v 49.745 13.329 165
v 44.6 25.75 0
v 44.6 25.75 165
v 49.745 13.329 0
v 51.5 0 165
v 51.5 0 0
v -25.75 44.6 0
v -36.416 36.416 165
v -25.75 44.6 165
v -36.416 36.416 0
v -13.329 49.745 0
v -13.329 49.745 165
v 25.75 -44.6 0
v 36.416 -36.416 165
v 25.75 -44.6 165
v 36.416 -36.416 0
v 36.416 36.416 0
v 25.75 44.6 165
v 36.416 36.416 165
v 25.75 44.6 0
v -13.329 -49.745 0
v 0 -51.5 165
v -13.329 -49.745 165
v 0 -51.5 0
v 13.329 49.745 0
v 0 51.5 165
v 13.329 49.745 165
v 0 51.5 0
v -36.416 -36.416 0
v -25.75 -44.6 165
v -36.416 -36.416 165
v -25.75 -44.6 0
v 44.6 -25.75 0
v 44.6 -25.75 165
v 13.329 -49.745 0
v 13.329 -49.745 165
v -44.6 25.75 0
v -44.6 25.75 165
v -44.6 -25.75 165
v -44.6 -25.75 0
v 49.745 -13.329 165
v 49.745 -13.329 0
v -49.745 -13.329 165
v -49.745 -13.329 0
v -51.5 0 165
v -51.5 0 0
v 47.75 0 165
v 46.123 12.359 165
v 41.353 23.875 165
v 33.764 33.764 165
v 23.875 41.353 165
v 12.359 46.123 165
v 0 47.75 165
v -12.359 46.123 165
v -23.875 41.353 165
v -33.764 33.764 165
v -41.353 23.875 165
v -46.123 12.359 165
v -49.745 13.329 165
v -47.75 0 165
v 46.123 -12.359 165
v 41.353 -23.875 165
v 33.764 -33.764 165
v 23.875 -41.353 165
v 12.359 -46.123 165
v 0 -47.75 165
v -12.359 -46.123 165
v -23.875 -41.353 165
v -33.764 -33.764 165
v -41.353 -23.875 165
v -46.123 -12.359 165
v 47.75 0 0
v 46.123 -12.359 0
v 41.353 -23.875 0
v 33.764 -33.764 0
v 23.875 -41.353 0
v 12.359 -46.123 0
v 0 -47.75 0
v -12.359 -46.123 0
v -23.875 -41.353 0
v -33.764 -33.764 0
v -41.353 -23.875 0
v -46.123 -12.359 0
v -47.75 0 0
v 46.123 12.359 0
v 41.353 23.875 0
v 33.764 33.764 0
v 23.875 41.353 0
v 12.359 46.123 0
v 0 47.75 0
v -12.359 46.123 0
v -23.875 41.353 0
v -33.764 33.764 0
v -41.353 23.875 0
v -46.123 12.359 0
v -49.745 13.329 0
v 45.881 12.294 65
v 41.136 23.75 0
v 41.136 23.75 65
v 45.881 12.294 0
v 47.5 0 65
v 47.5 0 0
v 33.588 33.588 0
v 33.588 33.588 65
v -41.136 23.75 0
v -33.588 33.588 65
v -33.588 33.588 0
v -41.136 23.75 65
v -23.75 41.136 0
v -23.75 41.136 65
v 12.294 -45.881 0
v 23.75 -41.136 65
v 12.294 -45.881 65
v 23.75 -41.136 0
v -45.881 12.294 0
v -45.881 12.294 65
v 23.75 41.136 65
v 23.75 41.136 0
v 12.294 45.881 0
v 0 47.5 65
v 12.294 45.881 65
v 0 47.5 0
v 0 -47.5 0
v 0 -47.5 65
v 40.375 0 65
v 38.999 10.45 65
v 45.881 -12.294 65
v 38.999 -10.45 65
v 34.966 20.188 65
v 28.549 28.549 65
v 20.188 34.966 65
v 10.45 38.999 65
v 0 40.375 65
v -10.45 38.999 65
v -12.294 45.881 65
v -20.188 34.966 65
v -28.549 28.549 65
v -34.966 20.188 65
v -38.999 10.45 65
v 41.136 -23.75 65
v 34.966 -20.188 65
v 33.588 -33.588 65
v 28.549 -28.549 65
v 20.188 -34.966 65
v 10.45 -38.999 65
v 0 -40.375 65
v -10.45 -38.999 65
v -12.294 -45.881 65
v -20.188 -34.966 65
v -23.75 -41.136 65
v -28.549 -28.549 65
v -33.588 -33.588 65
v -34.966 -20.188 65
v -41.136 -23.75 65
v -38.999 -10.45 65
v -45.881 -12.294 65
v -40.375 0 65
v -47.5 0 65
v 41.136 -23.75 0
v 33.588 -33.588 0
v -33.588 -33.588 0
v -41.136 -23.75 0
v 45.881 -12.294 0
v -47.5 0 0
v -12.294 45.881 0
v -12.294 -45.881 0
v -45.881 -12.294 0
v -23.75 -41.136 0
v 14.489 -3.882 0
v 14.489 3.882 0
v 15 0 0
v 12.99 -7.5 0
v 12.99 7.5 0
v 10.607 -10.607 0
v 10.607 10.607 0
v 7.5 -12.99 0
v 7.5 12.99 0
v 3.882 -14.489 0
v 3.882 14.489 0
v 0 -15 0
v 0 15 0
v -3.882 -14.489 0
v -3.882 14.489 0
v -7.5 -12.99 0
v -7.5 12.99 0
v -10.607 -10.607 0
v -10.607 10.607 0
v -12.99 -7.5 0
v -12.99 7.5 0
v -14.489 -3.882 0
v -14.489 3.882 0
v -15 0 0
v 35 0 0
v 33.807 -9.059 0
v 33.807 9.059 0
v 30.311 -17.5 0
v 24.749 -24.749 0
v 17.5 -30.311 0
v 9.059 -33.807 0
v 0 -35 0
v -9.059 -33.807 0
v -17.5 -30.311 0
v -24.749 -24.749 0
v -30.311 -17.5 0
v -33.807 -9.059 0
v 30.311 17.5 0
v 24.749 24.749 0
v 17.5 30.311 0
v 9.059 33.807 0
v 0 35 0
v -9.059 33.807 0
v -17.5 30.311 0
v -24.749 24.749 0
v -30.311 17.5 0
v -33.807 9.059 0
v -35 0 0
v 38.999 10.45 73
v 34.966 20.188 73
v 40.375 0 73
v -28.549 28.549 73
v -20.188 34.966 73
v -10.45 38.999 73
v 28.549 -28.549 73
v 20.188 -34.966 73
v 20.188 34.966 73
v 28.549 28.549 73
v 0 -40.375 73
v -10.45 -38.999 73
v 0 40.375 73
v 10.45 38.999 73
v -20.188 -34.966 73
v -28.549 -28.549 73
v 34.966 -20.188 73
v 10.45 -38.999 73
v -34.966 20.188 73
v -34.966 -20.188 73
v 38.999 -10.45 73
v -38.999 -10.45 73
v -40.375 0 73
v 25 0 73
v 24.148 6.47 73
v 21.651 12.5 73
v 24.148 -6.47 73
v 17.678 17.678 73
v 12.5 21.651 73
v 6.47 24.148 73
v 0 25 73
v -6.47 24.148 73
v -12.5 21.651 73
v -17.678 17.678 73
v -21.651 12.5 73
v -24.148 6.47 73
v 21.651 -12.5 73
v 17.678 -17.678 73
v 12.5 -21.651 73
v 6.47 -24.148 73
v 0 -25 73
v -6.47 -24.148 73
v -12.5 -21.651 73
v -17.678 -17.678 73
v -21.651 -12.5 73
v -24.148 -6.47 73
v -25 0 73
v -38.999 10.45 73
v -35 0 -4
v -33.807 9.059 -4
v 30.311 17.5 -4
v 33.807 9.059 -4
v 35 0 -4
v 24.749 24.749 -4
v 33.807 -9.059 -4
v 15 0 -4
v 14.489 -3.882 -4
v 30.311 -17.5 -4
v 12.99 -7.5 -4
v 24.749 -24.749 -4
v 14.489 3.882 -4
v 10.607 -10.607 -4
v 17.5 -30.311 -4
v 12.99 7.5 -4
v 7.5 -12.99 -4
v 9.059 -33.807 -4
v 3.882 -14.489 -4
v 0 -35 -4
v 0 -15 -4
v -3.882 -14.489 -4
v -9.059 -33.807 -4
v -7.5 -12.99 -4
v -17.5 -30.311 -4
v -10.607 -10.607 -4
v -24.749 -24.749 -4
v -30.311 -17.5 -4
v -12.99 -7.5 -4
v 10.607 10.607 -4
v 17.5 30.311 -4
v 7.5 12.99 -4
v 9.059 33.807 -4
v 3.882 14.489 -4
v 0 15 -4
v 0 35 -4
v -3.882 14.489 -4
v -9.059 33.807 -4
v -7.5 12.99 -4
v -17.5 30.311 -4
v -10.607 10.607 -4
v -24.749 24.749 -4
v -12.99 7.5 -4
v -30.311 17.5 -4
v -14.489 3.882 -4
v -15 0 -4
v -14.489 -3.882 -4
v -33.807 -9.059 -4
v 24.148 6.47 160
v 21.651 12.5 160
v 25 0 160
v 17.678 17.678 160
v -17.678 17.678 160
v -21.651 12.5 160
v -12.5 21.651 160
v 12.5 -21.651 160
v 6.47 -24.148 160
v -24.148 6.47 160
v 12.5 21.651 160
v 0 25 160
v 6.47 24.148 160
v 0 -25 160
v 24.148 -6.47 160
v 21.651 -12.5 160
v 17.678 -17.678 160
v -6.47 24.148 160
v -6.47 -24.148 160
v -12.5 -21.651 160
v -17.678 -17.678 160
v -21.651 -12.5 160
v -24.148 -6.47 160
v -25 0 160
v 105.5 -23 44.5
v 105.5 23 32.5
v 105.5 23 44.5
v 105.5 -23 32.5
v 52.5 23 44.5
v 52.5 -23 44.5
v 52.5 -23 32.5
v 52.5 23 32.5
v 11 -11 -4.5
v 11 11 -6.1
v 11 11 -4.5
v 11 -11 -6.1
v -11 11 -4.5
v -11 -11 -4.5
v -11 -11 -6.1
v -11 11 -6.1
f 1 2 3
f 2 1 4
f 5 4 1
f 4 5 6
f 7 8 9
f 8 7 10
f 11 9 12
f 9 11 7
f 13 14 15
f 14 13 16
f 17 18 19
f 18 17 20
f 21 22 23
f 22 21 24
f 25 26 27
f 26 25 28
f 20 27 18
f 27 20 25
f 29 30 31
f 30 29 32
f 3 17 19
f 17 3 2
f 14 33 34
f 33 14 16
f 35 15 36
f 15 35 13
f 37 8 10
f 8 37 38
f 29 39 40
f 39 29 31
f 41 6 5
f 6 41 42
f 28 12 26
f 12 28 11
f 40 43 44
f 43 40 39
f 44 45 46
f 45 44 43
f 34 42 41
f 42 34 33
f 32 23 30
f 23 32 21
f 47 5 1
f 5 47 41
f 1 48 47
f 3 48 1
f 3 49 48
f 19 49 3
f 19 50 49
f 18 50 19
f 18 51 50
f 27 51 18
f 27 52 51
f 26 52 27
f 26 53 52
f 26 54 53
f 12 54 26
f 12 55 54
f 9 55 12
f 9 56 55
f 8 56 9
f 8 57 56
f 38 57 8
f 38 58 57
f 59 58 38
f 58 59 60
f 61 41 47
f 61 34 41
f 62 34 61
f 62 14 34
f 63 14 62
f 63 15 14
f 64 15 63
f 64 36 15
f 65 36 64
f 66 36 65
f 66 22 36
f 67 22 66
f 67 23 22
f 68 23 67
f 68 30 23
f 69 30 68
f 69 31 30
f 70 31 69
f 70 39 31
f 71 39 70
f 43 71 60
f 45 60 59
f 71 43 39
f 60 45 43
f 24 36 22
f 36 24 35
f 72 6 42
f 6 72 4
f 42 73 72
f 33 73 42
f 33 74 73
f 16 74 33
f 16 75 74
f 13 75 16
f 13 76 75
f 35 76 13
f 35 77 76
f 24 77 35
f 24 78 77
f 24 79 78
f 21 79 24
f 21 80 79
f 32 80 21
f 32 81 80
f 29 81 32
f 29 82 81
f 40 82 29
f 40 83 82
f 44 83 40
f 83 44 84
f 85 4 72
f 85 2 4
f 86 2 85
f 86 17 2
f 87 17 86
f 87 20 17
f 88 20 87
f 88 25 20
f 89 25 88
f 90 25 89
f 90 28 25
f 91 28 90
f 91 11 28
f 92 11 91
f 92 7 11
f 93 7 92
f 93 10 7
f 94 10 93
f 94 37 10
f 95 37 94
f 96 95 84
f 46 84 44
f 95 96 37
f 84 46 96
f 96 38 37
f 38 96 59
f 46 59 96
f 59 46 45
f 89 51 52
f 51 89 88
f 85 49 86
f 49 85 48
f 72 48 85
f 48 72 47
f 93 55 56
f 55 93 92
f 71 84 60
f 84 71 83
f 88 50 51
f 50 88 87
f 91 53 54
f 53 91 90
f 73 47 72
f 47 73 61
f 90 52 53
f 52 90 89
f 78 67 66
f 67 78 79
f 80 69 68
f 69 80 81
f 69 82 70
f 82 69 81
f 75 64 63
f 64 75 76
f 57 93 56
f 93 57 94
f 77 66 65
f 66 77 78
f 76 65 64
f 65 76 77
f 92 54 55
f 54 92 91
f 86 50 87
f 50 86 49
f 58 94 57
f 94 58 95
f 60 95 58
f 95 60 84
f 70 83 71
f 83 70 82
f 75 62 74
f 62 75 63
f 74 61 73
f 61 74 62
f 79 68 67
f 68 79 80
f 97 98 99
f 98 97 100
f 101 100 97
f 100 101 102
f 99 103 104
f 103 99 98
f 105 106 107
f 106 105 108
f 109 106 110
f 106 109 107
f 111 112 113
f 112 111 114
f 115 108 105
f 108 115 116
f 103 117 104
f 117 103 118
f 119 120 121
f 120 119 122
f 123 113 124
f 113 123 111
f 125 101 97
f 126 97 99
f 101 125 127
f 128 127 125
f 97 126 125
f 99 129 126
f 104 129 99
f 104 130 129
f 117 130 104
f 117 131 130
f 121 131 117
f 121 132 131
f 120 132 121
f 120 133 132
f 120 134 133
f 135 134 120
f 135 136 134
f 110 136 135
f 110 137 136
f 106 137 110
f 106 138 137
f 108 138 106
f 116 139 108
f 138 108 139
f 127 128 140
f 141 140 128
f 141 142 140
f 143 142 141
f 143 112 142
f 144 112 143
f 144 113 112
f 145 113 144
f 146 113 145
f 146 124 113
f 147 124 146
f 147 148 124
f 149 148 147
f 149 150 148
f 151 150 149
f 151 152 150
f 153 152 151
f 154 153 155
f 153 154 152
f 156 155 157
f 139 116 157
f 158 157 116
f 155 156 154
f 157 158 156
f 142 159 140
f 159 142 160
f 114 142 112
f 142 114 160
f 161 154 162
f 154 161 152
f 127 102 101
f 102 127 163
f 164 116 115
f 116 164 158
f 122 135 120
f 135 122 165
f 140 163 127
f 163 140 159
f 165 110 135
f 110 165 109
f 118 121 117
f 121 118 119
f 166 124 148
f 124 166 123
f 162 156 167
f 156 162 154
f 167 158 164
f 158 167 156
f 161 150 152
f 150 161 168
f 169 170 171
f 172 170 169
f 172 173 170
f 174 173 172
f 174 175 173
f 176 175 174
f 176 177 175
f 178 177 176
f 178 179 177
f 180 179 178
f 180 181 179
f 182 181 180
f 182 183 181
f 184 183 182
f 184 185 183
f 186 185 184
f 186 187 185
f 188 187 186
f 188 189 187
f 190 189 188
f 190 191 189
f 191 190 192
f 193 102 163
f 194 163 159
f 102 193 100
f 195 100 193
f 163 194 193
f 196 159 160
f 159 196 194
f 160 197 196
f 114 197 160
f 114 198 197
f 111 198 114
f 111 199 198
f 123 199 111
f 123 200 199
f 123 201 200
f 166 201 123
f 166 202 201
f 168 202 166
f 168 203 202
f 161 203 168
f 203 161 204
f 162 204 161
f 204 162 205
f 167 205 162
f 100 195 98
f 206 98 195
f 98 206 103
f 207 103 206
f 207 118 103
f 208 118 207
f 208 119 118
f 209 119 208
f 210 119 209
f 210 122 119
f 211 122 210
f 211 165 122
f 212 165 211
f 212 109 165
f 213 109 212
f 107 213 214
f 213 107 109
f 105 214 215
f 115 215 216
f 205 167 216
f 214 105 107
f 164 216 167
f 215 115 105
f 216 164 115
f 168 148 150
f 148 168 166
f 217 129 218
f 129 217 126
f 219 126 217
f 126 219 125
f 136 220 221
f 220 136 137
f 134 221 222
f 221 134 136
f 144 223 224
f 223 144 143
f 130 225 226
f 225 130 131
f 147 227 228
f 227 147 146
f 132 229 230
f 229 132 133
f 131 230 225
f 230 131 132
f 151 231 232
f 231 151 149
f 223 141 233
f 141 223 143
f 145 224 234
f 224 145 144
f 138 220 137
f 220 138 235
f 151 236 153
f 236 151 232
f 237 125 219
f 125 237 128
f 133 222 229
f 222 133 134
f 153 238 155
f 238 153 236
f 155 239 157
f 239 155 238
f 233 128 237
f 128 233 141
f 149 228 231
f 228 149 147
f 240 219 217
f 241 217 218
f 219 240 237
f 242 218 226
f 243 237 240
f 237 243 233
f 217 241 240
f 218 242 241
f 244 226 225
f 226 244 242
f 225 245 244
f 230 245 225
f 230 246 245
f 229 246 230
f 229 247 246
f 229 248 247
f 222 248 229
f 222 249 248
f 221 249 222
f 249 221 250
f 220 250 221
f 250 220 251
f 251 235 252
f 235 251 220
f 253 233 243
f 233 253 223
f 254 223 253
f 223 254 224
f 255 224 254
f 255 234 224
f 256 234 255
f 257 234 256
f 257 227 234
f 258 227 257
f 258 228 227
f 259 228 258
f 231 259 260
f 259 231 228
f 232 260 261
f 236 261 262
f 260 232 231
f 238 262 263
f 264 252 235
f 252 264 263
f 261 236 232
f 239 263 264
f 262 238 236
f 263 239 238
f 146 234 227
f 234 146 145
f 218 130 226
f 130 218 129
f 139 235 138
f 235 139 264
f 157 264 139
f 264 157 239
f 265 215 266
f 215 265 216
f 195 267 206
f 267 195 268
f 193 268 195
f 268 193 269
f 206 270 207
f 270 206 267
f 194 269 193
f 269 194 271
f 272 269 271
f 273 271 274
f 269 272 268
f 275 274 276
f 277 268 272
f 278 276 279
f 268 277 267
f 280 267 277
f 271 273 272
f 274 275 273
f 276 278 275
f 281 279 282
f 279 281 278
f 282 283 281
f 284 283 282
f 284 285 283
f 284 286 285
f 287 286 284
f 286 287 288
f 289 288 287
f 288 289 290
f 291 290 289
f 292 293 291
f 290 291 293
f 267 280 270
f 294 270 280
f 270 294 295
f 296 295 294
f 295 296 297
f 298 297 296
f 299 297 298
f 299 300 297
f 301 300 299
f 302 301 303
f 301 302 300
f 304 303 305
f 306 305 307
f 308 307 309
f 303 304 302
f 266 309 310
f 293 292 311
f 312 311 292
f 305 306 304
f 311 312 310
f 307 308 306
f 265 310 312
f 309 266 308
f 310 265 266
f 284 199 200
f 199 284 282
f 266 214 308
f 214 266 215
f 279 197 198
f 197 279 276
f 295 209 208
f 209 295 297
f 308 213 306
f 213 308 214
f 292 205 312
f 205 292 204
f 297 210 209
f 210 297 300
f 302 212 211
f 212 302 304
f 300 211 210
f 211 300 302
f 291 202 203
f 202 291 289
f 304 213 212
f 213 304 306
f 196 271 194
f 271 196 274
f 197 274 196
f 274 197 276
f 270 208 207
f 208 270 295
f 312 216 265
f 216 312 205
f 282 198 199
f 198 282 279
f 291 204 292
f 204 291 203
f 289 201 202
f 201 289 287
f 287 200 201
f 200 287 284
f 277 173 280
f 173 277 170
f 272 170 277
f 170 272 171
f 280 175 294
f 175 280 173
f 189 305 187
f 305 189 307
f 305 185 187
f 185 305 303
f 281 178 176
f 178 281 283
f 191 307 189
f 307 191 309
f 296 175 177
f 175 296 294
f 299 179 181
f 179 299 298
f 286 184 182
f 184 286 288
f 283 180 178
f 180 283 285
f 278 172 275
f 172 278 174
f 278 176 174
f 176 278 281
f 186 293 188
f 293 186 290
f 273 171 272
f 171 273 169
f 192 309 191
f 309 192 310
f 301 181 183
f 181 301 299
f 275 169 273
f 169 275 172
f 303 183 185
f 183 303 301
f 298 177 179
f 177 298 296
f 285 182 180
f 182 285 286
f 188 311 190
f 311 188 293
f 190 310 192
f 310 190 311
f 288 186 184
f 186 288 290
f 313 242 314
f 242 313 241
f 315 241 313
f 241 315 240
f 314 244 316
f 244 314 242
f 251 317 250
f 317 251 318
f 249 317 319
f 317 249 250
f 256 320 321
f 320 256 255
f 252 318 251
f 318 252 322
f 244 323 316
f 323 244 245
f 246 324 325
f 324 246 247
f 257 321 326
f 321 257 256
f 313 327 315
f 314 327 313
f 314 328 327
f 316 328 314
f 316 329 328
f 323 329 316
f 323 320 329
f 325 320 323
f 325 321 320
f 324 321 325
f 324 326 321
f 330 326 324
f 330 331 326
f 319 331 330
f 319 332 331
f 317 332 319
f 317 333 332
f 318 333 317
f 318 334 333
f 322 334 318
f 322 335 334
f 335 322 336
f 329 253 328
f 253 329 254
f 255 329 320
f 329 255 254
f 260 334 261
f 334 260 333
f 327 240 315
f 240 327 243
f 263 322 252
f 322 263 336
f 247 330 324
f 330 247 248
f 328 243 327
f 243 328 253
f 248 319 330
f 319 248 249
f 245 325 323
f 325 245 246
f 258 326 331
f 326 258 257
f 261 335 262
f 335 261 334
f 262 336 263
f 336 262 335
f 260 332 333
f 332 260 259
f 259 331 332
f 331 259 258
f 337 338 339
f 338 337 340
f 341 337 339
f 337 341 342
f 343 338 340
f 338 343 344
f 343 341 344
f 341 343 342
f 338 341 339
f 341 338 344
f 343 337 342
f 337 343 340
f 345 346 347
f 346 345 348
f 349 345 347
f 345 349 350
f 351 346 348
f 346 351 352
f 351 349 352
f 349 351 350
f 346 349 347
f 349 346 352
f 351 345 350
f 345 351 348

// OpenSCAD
// file: hip.scad
// hip.scad
// Free Humanoid Platform — Leg v0.1 — hip 3-DoF cluster
//
// Three serial revolute joints (yaw → abduction → flexion) clustered so
// their axes intersect at the hip center. Each joint = cycloidal reducer
// (BOM hip_*_reducer) + Maxon EC-i 50/52 BLDC motor + Moteus n1 + AS5048A
// + optional strain-gauge bridge.
//
// Module signature: hip(joint_torques = [yaw, abd, flex])
//                   Peak torques in N·m used to size envelopes; defaults
//                   come from leg_params.scad.
//
// Corpus: sumitomo-cyclo (1937) for cycloidal prior-art shielding.
// REFERENCE GEOMETRY — NOT VALIDATED BY PHYSICAL BUILD.

include <leg_params.scad>;

// --------------------------------------------------------------------------
// cycloidal_envelope(ratio, peak_torque) — cylindrical envelope of an
// Onvio / Sumitomo cycloidal reducer. ratio ∈ {30, 50}.
// --------------------------------------------------------------------------
module cycloidal_envelope(ratio = 30, peak_nm = 100) {
    od     = (ratio == 30) ? cyclo_30_body_od : cyclo_50_body_od;
    length = (ratio == 30) ? cyclo_30_body_length : cyclo_50_body_length;
    color("DarkSlateGray")
        cylinder(h = length, d = od, center = false);
    // Output flange (slightly larger disk on the output side)
    color("DimGray")
        translate([0, 0, length])
            cylinder(h = 8.0, d = od * 0.85, center = false);
}

// --------------------------------------------------------------------------
// motor_envelope(motor_class) — EC-i 50 or EC-i 52
// --------------------------------------------------------------------------
module motor_envelope(motor_class = "EC-i-50") {
    od     = (motor_class == "EC-i-52") ? ec_i_52_od : ec_i_50_od;
    length = (motor_class == "EC-i-52") ? ec_i_52_length : ec_i_50_length;
    color("Goldenrod")
        cylinder(h = length, d = od, center = false);
}

// --------------------------------------------------------------------------
// moteus_n1_envelope() — small box on housing wall
// --------------------------------------------------------------------------
module moteus_n1_envelope() {
    color("ForestGreen")
        cube([moteus_n1_w, moteus_n1_l, moteus_n1_h], center = false);
}

// --------------------------------------------------------------------------
// hip_joint_module(ratio, motor_class, joint_name)
//   One single hip-joint stack: cycloidal + motor + controller in housing.
// --------------------------------------------------------------------------
module hip_joint_module(ratio = 30, motor_class = "EC-i-50",
                         joint_name = "yaw") {
    body_od     = (ratio == 30) ? cyclo_30_body_od : cyclo_50_body_od;
    body_length = (ratio == 30) ? cyclo_30_body_length : cyclo_50_body_length;
    motor_length = (motor_class == "EC-i-52") ? ec_i_52_length : ec_i_50_length;

    // Housing (thin-walled aluminum shell wrapping the cycloidal + motor)
    color("Silver", 0.4)
    difference() {
        cylinder(h = body_length + motor_length + 10.0,
                 d = body_od + 8.0, center = false);
        translate([0, 0, -0.1])
            cylinder(h = body_length + motor_length + 10.2,
                     d = body_od + 0.5, center = false);
    }
    // Cycloidal reducer
    cycloidal_envelope(ratio = ratio,
                        peak_nm = (joint_name == "flex") ? hip_flex_peak_torque_nm
                                  : (joint_name == "abd") ? hip_abd_peak_torque_nm
                                  : hip_yaw_peak_torque_nm);
    // Motor on input side (proximal-axial)
    translate([0, 0, body_length + 5.0])
        motor_envelope(motor_class = motor_class);
    // Moteus n1 on the side of the housing
    translate([body_od / 2 + 5.0, -moteus_n1_l / 2, body_length / 2])
        moteus_n1_envelope();
    // AS5048A PCB on output side (distal-axial)
    translate([-as5048_pcb_w / 2, -as5048_pcb_l / 2, -3.0])
        color("DarkRed")
            cube([as5048_pcb_w, as5048_pcb_l, as5048_pcb_h]);
}

// --------------------------------------------------------------------------
// hip(joint_torques) — 3-DoF cluster with axes intersecting at hip center
//   joint_torques = [yaw_peak_nm, abd_peak_nm, flex_peak_nm]
//
// Layout: hip-yaw axis is vertical (Z). Hip-abd axis is X (frontal).
// Hip-flex axis is Y (sagittal). All three intersect at origin (hip center).
// Cycloidals are arranged so the joint stacks fan out radially from the
// hip center; this keeps the kinematic intersection clean while allowing
// physical envelopes to coexist.
// --------------------------------------------------------------------------
module hip(joint_torques = [hip_yaw_peak_torque_nm,
                             hip_abd_peak_torque_nm,
                             hip_flex_peak_torque_nm]) {
    // Compile-time ratio + motor selection per joint. Hard-coded to match
    // the v0.1 BOM; future variants can pass these in.
    yaw_ratio   = 30;   yaw_motor   = "EC-i-50";
    abd_ratio   = 50;   abd_motor   = "EC-i-50";
    flex_ratio  = 50;   flex_motor  = "EC-i-52";

    // Hip-yaw stack — axis along +Z, motor extending up out of pelvis
    translate([0, 0, 0])
        rotate([0, 0, 0])
            hip_joint_module(ratio = yaw_ratio, motor_class = yaw_motor,
                              joint_name = "yaw");

    // Hip-abd stack — axis along +X, mounted lateral
    translate([cyclo_30_body_od / 2 + 20, 0, 0])
        rotate([0, 90, 0])
            hip_joint_module(ratio = abd_ratio, motor_class = abd_motor,
                              joint_name = "abd");

    // Hip-flex stack — axis along +Y, mounted aft (sagittal)
    translate([0, cyclo_50_body_od / 2 + 20, 0])
        rotate([90, 0, 0])
            hip_joint_module(ratio = flex_ratio, motor_class = flex_motor,
                              joint_name = "flex");

    // Hip-torso mount plate (BOM hip_torso_mount_plate)
    translate([-hip_mount_plate_w / 2, -hip_mount_plate_l / 2,
               -hip_mount_plate_t - 5.0])
        color("Silver")
            difference() {
                cube([hip_mount_plate_w, hip_mount_plate_l,
                       hip_mount_plate_t]);
                // 4× M8 mount holes
                for (sx = [-1, 1])
                for (sy = [-1, 1])
                    translate([hip_mount_plate_w / 2 + sx * hip_mount_pcd / 2,
                               hip_mount_plate_l / 2 + sy * hip_mount_pcd / 2,
                               -0.1])
                        cylinder(h = hip_mount_plate_t + 0.2,
                                 d = m8_clear_dia, center = false);
            }
}

// --------------------------------------------------------------------------
// Sanity-check echo when standalone
// --------------------------------------------------------------------------
echo(str("hip.scad: peak torques = yaw:", hip_yaw_peak_torque_nm,
          " abd:", hip_abd_peak_torque_nm,
          " flex:", hip_flex_peak_torque_nm, " N·m"));

// --------------------------------------------------------------------------
// Demo render when standalone
// --------------------------------------------------------------------------
hip();
// main file
// knee.scad
// Free Humanoid Platform — Leg v0.1 — knee 1-DoF joint
//
// Single revolute joint (sagittal-plane flexion) using cycloidal reducer
// (BOM knee_reducer, RV-E-30E-HT, 30:1) + Maxon EC-i 50 (BOM knee_motor)
// + Moteus n1 (BOM knee_controller) + AS5048A position sensor + optional
// strain-gauge bridge.
//
// Corpus: sumitomo-cyclo (1937).
// REFERENCE GEOMETRY — NOT VALIDATED BY PHYSICAL BUILD.

include <leg_params.scad>;
use <hip.scad>;   // reuse cycloidal_envelope, motor_envelope, moteus_n1_envelope

// --------------------------------------------------------------------------
// knee_housing() — milled aluminum housing (BOM knee_housing)
// --------------------------------------------------------------------------
module knee_housing() {
    body_od     = cyclo_30_body_od;
    body_length = cyclo_30_body_length + ec_i_50_length + 10.0;

    color("Silver", 0.4)
    difference() {
        // Outer shell
        cylinder(h = body_length, d = body_od + 8.0, center = false);
        // Hollow interior to fit cycloidal + motor
        translate([0, 0, -0.1])
            cylinder(h = body_length + 0.2, d = body_od + 0.5, center = false);
    }
}

// --------------------------------------------------------------------------
// knee_torque_sensor() — annular strain-gauge disk (optional, BOM
// knee_torque_sensor)
// --------------------------------------------------------------------------
module knee_torque_sensor() {
    color("Maroon", 0.7)
    difference() {
        cylinder(h = sg_disk_thickness, d = sg_disk_od, center = false);
        translate([0, 0, -0.1])
            cylinder(h = sg_disk_thickness + 0.2, d = sg_disk_id, center = false);
    }
}

// --------------------------------------------------------------------------
// knee() — full knee joint stack
// --------------------------------------------------------------------------
module knee() {
    // Housing
    knee_housing();
    // Cycloidal reducer (input/output along Z)
    cycloidal_envelope(ratio = 30, peak_nm = knee_peak_torque_nm);
    // Motor on the proximal end
    translate([0, 0, cyclo_30_body_length + 5.0])
        motor_envelope(motor_class = "EC-i-50");
    // Moteus n1 on housing wall
    translate([cyclo_30_body_od / 2 + 5.0, -moteus_n1_l / 2,
               cyclo_30_body_length / 2])
        moteus_n1_envelope();
    // Strain-gauge disk on output side (between cycloidal output and tibia
    // end-cap input)
    translate([0, 0, -sg_disk_thickness])
        knee_torque_sensor();
    // AS5048A PCB on output side
    translate([-as5048_pcb_w / 2, -as5048_pcb_l / 2,
               -sg_disk_thickness - as5048_pcb_h - 0.5])
        color("DarkRed")
            cube([as5048_pcb_w, as5048_pcb_l, as5048_pcb_h]);
}

// --------------------------------------------------------------------------
// Demo render
// --------------------------------------------------------------------------
echo(str("knee.scad: peak torque ", knee_peak_torque_nm, " N·m, ratio 30:1"));
knee();
